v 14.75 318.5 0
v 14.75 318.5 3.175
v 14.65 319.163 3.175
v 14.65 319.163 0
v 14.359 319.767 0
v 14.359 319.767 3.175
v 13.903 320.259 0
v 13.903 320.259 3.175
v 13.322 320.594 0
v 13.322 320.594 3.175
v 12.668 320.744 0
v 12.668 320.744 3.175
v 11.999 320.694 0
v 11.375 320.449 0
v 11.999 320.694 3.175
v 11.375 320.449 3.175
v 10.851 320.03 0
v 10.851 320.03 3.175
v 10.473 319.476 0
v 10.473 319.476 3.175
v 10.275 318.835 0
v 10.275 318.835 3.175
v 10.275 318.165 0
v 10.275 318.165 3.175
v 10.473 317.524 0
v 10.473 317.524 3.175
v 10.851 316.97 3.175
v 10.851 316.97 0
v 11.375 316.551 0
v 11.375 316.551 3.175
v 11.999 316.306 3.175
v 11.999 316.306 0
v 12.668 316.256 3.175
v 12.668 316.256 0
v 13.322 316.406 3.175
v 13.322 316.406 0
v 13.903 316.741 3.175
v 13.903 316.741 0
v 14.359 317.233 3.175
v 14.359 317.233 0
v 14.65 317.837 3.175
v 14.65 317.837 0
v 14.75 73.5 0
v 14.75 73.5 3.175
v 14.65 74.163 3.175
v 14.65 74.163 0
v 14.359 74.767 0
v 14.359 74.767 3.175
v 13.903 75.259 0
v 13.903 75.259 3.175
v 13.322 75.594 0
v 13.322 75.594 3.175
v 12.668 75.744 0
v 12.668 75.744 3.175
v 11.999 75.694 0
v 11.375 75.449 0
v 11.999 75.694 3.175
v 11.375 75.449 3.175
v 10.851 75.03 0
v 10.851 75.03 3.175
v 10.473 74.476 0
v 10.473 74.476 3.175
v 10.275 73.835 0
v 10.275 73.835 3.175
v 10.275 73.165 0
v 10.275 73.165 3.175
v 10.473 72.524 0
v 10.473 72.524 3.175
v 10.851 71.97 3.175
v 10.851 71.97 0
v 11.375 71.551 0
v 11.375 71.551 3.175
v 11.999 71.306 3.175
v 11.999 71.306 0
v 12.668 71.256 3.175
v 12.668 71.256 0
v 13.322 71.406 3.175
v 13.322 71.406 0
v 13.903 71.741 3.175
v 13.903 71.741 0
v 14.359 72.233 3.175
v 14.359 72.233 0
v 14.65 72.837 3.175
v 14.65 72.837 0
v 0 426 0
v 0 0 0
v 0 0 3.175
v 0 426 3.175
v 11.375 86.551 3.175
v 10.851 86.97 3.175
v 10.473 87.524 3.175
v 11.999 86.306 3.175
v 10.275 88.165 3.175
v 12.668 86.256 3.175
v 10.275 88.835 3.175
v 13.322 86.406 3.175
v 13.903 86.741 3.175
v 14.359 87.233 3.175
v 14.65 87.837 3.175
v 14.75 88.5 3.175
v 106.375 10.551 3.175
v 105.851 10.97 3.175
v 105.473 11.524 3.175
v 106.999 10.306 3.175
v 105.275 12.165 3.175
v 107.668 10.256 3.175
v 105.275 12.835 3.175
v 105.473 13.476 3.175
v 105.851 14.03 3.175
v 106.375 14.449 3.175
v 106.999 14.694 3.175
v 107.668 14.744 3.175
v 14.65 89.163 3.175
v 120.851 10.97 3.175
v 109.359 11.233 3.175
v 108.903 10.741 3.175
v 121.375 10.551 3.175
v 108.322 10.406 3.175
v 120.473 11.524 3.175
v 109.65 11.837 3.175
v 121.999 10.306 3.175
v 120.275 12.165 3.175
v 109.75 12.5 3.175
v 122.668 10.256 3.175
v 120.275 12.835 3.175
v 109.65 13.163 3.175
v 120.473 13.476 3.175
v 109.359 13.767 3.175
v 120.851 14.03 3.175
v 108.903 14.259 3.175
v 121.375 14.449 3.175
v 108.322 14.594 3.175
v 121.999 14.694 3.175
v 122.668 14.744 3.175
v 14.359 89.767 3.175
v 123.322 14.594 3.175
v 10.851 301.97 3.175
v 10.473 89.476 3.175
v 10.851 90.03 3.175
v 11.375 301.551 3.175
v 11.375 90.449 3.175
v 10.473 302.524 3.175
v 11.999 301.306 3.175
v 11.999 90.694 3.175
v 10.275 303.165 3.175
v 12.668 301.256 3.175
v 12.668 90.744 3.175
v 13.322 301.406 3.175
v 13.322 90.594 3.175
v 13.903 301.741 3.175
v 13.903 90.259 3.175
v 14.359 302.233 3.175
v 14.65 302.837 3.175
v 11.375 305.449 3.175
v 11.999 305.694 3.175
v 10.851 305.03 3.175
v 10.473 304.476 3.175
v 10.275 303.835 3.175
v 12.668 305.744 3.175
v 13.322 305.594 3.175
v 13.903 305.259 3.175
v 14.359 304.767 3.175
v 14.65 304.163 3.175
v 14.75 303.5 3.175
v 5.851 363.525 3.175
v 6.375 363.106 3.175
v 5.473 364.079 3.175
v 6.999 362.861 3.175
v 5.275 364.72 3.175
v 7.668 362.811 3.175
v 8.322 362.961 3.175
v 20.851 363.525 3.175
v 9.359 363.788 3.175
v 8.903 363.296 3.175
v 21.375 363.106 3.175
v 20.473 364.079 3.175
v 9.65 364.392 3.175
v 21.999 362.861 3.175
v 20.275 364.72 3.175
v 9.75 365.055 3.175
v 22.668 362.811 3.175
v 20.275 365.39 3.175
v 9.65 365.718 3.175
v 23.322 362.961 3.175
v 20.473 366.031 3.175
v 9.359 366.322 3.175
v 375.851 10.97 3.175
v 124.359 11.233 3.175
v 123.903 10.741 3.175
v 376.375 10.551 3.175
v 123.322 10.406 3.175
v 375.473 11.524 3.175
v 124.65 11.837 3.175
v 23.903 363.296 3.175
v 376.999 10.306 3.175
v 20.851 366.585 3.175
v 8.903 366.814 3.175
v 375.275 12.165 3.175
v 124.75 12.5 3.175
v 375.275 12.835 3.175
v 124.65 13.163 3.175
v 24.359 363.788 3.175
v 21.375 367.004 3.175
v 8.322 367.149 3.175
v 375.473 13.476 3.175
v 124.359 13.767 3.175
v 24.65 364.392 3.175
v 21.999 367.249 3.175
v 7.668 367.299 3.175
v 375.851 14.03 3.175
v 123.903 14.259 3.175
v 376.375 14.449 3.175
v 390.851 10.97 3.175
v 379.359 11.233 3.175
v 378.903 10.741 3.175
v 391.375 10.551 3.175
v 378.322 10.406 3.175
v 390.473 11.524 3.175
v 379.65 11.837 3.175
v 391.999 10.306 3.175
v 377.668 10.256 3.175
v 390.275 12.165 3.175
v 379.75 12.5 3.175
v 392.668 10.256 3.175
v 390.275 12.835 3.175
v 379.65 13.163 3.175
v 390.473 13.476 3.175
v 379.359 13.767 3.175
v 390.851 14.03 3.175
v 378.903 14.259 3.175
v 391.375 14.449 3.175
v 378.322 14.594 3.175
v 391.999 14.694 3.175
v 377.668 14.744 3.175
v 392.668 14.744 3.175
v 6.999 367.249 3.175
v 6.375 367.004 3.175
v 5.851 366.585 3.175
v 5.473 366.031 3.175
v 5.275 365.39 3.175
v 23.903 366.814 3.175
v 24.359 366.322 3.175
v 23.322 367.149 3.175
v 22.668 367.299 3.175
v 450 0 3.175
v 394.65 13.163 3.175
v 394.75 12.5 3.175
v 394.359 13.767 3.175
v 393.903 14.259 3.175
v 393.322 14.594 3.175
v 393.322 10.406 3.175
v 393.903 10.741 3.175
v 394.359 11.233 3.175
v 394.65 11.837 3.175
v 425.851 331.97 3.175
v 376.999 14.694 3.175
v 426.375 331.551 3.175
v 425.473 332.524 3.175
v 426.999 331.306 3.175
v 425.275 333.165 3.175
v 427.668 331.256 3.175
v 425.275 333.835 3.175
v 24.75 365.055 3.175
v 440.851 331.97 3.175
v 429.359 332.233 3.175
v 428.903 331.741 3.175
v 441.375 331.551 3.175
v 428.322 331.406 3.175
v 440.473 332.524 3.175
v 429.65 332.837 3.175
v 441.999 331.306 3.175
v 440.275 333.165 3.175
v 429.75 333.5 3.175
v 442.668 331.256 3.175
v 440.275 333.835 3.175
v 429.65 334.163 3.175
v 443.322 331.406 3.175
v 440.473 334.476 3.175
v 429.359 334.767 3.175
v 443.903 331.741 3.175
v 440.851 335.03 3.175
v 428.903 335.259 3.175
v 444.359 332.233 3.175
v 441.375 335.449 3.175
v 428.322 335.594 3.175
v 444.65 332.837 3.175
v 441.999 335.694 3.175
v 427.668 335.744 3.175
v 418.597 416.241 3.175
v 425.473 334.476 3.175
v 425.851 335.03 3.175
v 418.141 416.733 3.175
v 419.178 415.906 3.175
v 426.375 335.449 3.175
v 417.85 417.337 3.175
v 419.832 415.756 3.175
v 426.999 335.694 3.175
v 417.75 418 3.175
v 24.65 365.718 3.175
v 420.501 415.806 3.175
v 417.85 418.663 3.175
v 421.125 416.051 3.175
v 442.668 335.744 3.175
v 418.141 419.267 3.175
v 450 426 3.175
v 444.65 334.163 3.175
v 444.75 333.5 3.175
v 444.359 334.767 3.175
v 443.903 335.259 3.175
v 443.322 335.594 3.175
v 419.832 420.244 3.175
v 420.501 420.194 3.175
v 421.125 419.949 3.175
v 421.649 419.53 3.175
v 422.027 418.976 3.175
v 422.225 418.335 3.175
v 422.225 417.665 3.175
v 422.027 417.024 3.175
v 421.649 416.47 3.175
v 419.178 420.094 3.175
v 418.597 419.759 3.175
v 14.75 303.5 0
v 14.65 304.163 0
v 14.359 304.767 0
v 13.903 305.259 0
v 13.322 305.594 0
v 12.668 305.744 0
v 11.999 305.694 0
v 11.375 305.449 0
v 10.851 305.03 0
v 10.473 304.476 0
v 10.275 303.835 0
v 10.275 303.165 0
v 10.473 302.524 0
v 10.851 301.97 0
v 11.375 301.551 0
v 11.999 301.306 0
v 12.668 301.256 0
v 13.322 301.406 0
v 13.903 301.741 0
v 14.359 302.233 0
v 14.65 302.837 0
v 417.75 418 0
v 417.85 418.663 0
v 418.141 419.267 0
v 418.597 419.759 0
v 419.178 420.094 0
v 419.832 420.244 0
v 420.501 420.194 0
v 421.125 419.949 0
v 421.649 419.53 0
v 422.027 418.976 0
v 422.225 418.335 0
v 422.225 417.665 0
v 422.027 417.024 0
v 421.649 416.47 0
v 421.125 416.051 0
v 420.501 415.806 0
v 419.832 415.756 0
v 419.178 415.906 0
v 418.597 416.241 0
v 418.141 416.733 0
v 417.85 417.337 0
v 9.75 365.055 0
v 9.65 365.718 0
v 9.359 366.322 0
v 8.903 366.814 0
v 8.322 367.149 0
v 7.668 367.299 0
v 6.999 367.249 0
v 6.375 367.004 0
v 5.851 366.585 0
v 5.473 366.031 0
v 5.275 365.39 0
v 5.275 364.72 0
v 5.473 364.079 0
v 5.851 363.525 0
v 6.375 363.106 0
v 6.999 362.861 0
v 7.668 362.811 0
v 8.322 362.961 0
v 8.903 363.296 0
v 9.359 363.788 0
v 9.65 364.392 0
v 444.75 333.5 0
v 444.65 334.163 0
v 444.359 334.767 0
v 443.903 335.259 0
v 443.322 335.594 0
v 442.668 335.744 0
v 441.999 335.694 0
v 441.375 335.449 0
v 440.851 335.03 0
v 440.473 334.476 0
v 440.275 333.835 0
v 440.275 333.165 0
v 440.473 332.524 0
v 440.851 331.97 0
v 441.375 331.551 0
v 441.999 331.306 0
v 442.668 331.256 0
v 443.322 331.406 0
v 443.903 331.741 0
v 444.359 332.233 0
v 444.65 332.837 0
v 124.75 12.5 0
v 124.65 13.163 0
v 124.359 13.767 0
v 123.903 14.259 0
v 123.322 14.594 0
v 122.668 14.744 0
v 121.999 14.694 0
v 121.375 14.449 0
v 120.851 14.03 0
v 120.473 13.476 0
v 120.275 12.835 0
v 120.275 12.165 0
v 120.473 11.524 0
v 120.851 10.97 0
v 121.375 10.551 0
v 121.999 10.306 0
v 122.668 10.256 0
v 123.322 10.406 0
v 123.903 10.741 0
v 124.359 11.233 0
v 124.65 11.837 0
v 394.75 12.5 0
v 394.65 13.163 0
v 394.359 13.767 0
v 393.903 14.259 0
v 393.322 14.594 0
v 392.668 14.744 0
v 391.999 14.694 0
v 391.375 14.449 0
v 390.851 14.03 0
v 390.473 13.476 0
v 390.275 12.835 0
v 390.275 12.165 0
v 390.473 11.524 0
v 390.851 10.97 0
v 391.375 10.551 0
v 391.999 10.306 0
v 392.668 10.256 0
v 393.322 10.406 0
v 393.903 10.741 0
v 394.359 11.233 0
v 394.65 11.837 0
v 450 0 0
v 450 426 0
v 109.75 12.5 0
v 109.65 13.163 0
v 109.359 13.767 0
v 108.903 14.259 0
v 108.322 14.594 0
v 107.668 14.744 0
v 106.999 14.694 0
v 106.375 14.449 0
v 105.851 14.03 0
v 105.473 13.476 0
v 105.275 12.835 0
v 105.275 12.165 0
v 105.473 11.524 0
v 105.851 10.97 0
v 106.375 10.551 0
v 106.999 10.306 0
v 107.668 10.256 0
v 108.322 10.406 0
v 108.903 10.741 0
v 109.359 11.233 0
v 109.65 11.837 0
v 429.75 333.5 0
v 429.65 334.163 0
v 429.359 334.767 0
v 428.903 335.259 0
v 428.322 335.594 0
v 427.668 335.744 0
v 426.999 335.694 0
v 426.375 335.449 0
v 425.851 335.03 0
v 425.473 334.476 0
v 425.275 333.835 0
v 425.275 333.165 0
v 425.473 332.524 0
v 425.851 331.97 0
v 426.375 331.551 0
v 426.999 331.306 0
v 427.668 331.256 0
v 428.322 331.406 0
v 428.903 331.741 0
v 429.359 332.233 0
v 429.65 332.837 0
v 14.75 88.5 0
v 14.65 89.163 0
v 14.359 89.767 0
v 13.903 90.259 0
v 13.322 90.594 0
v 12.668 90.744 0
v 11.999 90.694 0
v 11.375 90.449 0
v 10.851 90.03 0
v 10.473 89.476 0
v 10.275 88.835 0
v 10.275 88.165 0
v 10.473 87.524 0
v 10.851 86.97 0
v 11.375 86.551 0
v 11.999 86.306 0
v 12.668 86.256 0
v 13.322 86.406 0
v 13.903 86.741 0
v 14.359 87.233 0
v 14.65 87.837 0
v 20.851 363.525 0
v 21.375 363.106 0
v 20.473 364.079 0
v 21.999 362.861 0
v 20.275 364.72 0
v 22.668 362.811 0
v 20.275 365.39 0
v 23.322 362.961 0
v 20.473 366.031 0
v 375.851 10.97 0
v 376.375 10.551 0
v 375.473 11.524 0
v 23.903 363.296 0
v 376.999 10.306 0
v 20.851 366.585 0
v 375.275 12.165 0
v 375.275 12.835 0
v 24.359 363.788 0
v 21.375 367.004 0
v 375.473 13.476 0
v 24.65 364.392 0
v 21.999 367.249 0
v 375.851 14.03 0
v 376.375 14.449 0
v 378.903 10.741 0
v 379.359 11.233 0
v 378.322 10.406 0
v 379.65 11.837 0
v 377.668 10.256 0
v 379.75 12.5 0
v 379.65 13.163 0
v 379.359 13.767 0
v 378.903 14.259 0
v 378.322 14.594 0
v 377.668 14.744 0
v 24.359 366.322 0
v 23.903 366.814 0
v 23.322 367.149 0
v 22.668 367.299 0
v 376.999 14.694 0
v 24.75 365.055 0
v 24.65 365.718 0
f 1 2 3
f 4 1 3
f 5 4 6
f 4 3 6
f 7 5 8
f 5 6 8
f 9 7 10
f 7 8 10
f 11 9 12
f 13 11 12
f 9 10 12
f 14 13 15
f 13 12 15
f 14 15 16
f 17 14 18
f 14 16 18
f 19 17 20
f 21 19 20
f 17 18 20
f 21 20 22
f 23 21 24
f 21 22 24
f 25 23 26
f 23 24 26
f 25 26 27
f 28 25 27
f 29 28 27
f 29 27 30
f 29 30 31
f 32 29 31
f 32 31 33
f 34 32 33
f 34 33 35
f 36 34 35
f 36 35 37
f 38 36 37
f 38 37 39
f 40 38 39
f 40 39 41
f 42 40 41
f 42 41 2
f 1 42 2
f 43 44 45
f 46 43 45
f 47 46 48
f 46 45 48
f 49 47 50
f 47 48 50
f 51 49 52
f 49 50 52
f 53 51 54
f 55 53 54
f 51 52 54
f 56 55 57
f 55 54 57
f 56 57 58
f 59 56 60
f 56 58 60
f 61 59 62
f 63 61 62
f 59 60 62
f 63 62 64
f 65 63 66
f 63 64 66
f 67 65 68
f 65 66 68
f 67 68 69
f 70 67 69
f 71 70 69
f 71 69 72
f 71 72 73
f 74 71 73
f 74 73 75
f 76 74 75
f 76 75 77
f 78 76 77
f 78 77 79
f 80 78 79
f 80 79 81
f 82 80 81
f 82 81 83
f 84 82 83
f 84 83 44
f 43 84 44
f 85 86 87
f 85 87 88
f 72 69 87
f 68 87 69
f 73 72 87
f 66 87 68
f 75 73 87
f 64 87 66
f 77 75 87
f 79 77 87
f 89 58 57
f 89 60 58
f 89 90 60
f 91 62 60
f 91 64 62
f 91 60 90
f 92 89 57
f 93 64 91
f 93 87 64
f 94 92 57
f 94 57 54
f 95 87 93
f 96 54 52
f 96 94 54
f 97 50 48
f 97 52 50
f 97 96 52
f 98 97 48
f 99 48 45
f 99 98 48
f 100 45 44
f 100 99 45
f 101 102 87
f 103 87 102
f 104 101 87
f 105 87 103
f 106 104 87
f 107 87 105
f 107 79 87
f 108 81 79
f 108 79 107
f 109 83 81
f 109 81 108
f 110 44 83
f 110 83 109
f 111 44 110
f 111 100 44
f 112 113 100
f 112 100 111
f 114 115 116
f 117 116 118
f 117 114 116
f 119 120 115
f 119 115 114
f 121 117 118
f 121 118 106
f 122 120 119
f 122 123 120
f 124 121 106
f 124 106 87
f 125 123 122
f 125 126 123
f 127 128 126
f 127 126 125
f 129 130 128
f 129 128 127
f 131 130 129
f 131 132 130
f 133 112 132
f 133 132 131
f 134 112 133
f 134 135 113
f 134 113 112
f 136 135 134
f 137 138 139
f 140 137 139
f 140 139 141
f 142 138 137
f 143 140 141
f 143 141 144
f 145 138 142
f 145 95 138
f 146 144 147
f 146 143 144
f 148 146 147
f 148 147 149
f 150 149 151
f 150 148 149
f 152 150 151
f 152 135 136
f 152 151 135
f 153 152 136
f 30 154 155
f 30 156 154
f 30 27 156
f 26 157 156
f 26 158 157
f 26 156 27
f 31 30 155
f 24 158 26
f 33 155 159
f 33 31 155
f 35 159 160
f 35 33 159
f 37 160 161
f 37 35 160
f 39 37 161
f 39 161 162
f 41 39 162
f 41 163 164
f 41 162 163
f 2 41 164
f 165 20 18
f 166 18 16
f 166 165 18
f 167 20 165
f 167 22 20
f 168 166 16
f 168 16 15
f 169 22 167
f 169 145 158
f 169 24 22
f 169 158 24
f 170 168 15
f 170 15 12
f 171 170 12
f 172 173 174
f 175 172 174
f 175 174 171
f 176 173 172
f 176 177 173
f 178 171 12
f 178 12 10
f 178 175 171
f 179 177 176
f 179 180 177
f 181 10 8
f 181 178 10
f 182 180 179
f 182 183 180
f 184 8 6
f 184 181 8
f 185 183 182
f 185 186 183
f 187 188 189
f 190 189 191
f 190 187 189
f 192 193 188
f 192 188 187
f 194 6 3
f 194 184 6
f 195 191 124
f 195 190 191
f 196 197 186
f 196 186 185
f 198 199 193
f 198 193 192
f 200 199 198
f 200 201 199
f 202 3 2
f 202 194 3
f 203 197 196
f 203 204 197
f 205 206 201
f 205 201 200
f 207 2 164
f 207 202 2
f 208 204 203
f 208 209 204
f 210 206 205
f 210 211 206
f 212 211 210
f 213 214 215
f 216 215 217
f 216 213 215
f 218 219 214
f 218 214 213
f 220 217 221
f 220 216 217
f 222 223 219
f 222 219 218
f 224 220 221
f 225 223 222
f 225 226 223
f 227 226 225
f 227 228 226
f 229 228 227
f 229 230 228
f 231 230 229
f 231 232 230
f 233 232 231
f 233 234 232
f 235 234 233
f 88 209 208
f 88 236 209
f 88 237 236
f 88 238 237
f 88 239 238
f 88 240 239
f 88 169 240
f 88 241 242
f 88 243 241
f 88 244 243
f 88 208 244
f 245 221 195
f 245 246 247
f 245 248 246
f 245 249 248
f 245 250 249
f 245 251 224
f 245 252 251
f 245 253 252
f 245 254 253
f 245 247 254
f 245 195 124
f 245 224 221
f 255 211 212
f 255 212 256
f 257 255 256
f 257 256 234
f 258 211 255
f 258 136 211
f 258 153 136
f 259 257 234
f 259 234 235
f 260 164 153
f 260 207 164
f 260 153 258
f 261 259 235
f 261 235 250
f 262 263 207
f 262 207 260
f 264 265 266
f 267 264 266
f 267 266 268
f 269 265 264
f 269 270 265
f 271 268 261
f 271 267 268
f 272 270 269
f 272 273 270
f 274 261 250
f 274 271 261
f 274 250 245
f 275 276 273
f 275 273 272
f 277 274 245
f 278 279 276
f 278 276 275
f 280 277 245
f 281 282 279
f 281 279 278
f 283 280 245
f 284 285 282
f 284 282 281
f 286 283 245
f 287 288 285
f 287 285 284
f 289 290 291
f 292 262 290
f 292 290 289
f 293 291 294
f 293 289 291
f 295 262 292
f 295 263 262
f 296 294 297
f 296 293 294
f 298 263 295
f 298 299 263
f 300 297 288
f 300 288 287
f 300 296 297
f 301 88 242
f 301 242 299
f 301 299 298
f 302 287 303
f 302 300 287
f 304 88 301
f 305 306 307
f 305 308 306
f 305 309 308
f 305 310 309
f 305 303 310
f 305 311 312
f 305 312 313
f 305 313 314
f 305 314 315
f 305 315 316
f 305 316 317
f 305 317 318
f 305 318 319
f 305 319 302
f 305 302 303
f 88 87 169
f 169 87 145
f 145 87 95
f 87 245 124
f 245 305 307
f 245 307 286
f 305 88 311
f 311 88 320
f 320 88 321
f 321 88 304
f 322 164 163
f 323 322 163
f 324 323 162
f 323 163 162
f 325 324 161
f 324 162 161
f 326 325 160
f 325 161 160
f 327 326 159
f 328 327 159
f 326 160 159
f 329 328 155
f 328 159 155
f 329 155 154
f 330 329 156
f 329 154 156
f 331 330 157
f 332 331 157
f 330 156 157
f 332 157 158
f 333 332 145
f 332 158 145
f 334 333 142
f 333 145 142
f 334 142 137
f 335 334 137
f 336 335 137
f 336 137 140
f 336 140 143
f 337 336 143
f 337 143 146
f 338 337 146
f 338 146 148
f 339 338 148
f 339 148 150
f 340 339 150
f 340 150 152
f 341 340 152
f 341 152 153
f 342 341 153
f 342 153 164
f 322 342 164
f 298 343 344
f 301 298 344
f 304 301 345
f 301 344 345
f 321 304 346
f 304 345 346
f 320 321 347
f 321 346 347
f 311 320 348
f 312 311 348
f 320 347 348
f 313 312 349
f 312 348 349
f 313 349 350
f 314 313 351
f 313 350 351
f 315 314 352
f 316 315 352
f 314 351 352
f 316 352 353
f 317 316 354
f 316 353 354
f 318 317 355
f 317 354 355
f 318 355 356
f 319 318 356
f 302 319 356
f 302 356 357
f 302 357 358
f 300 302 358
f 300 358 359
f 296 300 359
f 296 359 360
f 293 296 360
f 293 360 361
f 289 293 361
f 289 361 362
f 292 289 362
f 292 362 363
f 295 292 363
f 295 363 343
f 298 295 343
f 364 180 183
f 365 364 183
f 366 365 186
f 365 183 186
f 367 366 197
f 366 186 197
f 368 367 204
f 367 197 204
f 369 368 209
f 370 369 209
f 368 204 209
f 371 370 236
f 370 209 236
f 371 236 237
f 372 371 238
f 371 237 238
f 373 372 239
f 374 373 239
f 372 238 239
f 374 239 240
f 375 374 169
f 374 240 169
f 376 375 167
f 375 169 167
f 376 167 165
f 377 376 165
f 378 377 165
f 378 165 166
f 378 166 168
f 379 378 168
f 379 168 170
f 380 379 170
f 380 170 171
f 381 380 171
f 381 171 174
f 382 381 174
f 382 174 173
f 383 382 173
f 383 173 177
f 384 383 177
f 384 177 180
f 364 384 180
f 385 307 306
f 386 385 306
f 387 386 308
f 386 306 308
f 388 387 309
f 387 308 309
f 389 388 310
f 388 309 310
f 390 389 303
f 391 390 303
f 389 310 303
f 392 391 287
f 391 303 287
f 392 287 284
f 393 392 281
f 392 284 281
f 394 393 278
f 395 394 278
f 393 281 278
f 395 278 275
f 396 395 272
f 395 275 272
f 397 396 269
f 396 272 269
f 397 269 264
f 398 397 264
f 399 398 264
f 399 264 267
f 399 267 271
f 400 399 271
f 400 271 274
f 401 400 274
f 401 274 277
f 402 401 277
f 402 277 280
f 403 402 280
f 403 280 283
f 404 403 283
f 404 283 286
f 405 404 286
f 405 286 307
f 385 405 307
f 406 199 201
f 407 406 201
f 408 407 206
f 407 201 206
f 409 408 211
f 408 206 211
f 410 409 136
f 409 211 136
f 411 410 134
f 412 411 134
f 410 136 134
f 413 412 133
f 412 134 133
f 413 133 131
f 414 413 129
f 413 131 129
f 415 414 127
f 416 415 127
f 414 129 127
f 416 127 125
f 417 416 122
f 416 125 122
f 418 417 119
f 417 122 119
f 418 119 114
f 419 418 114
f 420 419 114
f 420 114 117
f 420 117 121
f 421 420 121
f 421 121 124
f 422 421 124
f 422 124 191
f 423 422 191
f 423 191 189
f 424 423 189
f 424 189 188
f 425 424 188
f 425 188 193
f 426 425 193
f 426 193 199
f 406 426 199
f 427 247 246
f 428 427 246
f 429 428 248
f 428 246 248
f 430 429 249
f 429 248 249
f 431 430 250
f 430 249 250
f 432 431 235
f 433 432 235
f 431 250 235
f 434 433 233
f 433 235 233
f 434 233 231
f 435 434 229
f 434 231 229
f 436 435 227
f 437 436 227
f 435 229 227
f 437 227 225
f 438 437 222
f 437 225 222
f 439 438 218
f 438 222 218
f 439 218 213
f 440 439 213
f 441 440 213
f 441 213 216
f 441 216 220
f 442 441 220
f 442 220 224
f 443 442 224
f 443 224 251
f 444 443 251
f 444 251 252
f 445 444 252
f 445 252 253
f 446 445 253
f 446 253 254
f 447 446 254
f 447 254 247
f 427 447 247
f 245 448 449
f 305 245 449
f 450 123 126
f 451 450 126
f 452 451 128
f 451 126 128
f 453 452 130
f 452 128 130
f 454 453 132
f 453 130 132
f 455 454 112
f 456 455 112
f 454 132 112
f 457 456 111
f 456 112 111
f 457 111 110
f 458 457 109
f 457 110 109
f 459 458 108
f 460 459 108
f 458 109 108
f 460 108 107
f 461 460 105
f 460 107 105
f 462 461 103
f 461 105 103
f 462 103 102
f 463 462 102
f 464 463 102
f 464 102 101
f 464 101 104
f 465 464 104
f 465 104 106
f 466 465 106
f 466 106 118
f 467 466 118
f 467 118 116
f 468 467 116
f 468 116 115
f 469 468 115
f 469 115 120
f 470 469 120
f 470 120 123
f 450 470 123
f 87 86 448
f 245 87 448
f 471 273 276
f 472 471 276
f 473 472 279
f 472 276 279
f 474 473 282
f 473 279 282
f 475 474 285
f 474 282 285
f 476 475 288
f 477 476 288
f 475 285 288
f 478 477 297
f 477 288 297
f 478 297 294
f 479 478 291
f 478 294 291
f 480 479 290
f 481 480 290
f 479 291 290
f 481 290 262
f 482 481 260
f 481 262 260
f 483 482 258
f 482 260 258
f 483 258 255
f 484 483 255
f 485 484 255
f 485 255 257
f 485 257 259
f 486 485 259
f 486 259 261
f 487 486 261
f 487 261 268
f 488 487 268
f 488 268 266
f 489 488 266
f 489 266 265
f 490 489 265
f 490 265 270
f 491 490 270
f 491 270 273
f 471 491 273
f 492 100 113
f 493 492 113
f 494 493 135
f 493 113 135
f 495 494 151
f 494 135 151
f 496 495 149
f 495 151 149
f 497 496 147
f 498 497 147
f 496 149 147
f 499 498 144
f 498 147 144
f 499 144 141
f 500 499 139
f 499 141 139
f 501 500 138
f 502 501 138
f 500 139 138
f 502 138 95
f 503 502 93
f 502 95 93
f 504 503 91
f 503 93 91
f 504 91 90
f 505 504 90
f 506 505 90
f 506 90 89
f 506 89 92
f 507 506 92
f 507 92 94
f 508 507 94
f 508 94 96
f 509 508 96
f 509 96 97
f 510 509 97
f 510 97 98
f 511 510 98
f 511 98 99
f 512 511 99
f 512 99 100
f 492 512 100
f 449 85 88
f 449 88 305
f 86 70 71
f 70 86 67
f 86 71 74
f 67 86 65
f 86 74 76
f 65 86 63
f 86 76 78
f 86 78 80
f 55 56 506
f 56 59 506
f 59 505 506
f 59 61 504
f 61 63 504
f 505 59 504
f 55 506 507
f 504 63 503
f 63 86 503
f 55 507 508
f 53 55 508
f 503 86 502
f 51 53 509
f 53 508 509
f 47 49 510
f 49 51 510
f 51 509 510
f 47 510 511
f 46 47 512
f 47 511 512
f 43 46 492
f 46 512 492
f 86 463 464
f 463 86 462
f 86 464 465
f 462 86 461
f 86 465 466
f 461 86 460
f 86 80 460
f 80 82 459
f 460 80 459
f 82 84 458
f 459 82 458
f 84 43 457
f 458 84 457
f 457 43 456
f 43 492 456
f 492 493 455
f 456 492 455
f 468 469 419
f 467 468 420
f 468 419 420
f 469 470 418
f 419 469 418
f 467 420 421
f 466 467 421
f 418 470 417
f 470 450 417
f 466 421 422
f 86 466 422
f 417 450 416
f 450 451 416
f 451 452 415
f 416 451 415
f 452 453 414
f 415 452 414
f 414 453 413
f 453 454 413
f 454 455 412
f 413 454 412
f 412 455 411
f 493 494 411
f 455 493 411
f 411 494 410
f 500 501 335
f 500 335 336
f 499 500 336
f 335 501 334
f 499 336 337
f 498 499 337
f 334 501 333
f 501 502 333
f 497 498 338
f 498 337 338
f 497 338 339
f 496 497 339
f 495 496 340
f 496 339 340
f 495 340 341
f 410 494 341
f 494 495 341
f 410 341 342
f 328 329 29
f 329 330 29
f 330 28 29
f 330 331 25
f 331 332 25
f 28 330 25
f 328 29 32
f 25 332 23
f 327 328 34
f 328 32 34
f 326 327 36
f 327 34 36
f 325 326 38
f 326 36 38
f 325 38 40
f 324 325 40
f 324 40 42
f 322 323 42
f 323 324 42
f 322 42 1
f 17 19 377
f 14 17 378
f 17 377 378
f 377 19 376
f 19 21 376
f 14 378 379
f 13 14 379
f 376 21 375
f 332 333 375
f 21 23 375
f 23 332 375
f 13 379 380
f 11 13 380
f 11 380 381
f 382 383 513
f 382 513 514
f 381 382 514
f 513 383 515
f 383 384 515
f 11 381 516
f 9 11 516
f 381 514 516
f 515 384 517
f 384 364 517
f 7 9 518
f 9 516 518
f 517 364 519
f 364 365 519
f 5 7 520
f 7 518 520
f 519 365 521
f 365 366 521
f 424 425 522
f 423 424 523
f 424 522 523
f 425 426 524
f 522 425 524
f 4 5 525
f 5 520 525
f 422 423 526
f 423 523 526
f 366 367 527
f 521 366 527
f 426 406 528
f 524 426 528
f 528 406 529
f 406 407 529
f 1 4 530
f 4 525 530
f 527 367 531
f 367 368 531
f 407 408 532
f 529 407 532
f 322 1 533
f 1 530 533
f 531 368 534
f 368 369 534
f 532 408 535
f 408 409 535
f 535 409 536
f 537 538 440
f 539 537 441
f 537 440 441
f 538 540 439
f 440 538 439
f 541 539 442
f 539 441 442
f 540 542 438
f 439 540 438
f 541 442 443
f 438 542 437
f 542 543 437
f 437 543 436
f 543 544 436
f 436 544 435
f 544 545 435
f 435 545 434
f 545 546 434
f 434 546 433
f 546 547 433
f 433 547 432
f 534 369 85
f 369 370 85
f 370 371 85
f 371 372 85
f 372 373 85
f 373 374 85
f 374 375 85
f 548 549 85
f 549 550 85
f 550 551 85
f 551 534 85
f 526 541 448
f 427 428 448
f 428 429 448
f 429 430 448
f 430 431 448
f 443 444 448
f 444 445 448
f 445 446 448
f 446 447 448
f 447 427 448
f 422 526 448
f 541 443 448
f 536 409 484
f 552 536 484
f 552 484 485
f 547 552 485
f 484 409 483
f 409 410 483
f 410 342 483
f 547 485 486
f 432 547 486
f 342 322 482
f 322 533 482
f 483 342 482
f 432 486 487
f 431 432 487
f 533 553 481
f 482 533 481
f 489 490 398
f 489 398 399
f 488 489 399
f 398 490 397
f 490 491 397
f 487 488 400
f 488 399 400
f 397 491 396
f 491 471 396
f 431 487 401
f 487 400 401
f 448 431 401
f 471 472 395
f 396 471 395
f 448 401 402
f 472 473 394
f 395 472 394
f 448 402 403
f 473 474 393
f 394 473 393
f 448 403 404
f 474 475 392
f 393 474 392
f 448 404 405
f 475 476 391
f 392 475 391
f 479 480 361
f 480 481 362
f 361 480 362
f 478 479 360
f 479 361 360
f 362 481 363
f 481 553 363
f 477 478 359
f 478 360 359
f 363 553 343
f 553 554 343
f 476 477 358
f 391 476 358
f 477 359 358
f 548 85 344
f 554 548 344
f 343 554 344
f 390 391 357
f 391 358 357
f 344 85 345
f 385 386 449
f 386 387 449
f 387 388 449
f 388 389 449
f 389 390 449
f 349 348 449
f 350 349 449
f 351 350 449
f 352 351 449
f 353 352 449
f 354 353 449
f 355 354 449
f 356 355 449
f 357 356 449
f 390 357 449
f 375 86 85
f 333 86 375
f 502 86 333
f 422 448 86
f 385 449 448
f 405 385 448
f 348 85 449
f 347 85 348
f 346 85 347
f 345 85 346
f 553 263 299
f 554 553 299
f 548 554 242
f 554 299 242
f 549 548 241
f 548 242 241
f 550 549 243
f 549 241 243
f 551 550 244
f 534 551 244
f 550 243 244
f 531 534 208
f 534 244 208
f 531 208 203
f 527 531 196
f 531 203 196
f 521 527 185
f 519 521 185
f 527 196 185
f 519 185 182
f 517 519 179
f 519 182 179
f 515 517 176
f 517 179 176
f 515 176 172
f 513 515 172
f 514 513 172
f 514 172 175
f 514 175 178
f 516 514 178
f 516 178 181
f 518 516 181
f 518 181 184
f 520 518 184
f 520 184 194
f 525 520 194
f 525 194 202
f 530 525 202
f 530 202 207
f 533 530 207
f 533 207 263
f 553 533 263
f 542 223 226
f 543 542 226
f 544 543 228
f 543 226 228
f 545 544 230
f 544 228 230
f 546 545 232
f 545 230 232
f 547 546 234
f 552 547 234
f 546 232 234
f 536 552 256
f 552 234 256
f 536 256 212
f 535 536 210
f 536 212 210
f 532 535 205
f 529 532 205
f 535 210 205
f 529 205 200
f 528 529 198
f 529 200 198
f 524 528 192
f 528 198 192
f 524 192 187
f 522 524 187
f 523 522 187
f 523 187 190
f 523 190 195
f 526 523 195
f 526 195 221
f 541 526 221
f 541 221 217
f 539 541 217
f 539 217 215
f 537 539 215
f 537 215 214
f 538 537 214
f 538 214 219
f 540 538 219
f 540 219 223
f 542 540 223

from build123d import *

# Parameters (mm, degrees)
SKETCH1_W           = 450
SKETCH1_H           = 426
BOSS_EXTRUDE1_DEPTH = 3.175
SKETCH8_R           = 2.25
CUT_EXTRUDE7_DEPTH  = 620.666104144
SKETCH2_R           = 2.25
CUT_EXTRUDE1_DEPTH  = 620.666104144
SKETCH3_R           = 2.25
CUT_EXTRUDE2_DEPTH  = 620.666104144
SKETCH5_R           = 2.25
CUT_EXTRUDE4_DEPTH  = 620.666104144
SKETCH7_R           = 2.25
CUT_EXTRUDE6_DEPTH  = 620.666104144


with BuildPart() as part:
    # Sketch1 → Boss-Extrude1 (new body)
    with BuildSketch(Plane.XY):
        with Locations((225, 213)):
            Rectangle(SKETCH1_W, SKETCH1_H)
    extrude(amount=BOSS_EXTRUDE1_DEPTH)

    # Sketch8 → Cut-Extrude7 (cut, through all)
    with BuildSketch(Plane(origin=(0, 0, 0), x_dir=(-1, 0, 0), z_dir=(0, 0, -1))):
        with Locations((-420, 418)):
            Circle(SKETCH8_R)
    extrude(amount=-CUT_EXTRUDE7_DEPTH, mode=Mode.SUBTRACT)

    # Sketch2 → Cut-Extrude1 (cut, through all)
    with BuildSketch(Plane.XY.offset(3.175)):
        with Locations((427.5, 333.5)):
            Circle(SKETCH2_R)
        with Locations((442.5, 333.5)):
            Circle(SKETCH2_R)
    extrude(amount=-CUT_EXTRUDE1_DEPTH, mode=Mode.SUBTRACT)

    # Sketch3 → Cut-Extrude2 (cut, through all)
    with BuildSketch(Plane.XY.offset(3.175)):
        with Locations((7.5, 365.055)):
            Circle(SKETCH3_R)
        with Locations((22.5, 365.055)):
            Circle(SKETCH3_R)
    extrude(amount=-CUT_EXTRUDE2_DEPTH, mode=Mode.SUBTRACT)

    # Sketch5 → Cut-Extrude4 (cut, through all)
    with BuildSketch(Plane.XY.offset(3.175)):
        with Locations((377.5, 12.5)):
            Circle(SKETCH5_R)
        with Locations((122.5, 12.5)):
            Circle(SKETCH5_R)
        with Locations((107.5, 12.5)):
            Circle(SKETCH5_R)
        with Locations((392.5, 12.5)):
            Circle(SKETCH5_R)
    extrude(amount=-CUT_EXTRUDE4_DEPTH, mode=Mode.SUBTRACT)

    # Sketch7 → Cut-Extrude6 (cut, through all)
    with BuildSketch(Plane.XY.offset(3.175)):
        with Locations((12.5, 303.5)):
            Circle(SKETCH7_R)
        with Locations((12.5, 318.5)):
            Circle(SKETCH7_R)
        with Locations((12.5, 73.5)):
            Circle(SKETCH7_R)
        with Locations((12.5, 88.5)):
            Circle(SKETCH7_R)
    extrude(amount=-CUT_EXTRUDE6_DEPTH, mode=Mode.SUBTRACT)


solid = part.part
